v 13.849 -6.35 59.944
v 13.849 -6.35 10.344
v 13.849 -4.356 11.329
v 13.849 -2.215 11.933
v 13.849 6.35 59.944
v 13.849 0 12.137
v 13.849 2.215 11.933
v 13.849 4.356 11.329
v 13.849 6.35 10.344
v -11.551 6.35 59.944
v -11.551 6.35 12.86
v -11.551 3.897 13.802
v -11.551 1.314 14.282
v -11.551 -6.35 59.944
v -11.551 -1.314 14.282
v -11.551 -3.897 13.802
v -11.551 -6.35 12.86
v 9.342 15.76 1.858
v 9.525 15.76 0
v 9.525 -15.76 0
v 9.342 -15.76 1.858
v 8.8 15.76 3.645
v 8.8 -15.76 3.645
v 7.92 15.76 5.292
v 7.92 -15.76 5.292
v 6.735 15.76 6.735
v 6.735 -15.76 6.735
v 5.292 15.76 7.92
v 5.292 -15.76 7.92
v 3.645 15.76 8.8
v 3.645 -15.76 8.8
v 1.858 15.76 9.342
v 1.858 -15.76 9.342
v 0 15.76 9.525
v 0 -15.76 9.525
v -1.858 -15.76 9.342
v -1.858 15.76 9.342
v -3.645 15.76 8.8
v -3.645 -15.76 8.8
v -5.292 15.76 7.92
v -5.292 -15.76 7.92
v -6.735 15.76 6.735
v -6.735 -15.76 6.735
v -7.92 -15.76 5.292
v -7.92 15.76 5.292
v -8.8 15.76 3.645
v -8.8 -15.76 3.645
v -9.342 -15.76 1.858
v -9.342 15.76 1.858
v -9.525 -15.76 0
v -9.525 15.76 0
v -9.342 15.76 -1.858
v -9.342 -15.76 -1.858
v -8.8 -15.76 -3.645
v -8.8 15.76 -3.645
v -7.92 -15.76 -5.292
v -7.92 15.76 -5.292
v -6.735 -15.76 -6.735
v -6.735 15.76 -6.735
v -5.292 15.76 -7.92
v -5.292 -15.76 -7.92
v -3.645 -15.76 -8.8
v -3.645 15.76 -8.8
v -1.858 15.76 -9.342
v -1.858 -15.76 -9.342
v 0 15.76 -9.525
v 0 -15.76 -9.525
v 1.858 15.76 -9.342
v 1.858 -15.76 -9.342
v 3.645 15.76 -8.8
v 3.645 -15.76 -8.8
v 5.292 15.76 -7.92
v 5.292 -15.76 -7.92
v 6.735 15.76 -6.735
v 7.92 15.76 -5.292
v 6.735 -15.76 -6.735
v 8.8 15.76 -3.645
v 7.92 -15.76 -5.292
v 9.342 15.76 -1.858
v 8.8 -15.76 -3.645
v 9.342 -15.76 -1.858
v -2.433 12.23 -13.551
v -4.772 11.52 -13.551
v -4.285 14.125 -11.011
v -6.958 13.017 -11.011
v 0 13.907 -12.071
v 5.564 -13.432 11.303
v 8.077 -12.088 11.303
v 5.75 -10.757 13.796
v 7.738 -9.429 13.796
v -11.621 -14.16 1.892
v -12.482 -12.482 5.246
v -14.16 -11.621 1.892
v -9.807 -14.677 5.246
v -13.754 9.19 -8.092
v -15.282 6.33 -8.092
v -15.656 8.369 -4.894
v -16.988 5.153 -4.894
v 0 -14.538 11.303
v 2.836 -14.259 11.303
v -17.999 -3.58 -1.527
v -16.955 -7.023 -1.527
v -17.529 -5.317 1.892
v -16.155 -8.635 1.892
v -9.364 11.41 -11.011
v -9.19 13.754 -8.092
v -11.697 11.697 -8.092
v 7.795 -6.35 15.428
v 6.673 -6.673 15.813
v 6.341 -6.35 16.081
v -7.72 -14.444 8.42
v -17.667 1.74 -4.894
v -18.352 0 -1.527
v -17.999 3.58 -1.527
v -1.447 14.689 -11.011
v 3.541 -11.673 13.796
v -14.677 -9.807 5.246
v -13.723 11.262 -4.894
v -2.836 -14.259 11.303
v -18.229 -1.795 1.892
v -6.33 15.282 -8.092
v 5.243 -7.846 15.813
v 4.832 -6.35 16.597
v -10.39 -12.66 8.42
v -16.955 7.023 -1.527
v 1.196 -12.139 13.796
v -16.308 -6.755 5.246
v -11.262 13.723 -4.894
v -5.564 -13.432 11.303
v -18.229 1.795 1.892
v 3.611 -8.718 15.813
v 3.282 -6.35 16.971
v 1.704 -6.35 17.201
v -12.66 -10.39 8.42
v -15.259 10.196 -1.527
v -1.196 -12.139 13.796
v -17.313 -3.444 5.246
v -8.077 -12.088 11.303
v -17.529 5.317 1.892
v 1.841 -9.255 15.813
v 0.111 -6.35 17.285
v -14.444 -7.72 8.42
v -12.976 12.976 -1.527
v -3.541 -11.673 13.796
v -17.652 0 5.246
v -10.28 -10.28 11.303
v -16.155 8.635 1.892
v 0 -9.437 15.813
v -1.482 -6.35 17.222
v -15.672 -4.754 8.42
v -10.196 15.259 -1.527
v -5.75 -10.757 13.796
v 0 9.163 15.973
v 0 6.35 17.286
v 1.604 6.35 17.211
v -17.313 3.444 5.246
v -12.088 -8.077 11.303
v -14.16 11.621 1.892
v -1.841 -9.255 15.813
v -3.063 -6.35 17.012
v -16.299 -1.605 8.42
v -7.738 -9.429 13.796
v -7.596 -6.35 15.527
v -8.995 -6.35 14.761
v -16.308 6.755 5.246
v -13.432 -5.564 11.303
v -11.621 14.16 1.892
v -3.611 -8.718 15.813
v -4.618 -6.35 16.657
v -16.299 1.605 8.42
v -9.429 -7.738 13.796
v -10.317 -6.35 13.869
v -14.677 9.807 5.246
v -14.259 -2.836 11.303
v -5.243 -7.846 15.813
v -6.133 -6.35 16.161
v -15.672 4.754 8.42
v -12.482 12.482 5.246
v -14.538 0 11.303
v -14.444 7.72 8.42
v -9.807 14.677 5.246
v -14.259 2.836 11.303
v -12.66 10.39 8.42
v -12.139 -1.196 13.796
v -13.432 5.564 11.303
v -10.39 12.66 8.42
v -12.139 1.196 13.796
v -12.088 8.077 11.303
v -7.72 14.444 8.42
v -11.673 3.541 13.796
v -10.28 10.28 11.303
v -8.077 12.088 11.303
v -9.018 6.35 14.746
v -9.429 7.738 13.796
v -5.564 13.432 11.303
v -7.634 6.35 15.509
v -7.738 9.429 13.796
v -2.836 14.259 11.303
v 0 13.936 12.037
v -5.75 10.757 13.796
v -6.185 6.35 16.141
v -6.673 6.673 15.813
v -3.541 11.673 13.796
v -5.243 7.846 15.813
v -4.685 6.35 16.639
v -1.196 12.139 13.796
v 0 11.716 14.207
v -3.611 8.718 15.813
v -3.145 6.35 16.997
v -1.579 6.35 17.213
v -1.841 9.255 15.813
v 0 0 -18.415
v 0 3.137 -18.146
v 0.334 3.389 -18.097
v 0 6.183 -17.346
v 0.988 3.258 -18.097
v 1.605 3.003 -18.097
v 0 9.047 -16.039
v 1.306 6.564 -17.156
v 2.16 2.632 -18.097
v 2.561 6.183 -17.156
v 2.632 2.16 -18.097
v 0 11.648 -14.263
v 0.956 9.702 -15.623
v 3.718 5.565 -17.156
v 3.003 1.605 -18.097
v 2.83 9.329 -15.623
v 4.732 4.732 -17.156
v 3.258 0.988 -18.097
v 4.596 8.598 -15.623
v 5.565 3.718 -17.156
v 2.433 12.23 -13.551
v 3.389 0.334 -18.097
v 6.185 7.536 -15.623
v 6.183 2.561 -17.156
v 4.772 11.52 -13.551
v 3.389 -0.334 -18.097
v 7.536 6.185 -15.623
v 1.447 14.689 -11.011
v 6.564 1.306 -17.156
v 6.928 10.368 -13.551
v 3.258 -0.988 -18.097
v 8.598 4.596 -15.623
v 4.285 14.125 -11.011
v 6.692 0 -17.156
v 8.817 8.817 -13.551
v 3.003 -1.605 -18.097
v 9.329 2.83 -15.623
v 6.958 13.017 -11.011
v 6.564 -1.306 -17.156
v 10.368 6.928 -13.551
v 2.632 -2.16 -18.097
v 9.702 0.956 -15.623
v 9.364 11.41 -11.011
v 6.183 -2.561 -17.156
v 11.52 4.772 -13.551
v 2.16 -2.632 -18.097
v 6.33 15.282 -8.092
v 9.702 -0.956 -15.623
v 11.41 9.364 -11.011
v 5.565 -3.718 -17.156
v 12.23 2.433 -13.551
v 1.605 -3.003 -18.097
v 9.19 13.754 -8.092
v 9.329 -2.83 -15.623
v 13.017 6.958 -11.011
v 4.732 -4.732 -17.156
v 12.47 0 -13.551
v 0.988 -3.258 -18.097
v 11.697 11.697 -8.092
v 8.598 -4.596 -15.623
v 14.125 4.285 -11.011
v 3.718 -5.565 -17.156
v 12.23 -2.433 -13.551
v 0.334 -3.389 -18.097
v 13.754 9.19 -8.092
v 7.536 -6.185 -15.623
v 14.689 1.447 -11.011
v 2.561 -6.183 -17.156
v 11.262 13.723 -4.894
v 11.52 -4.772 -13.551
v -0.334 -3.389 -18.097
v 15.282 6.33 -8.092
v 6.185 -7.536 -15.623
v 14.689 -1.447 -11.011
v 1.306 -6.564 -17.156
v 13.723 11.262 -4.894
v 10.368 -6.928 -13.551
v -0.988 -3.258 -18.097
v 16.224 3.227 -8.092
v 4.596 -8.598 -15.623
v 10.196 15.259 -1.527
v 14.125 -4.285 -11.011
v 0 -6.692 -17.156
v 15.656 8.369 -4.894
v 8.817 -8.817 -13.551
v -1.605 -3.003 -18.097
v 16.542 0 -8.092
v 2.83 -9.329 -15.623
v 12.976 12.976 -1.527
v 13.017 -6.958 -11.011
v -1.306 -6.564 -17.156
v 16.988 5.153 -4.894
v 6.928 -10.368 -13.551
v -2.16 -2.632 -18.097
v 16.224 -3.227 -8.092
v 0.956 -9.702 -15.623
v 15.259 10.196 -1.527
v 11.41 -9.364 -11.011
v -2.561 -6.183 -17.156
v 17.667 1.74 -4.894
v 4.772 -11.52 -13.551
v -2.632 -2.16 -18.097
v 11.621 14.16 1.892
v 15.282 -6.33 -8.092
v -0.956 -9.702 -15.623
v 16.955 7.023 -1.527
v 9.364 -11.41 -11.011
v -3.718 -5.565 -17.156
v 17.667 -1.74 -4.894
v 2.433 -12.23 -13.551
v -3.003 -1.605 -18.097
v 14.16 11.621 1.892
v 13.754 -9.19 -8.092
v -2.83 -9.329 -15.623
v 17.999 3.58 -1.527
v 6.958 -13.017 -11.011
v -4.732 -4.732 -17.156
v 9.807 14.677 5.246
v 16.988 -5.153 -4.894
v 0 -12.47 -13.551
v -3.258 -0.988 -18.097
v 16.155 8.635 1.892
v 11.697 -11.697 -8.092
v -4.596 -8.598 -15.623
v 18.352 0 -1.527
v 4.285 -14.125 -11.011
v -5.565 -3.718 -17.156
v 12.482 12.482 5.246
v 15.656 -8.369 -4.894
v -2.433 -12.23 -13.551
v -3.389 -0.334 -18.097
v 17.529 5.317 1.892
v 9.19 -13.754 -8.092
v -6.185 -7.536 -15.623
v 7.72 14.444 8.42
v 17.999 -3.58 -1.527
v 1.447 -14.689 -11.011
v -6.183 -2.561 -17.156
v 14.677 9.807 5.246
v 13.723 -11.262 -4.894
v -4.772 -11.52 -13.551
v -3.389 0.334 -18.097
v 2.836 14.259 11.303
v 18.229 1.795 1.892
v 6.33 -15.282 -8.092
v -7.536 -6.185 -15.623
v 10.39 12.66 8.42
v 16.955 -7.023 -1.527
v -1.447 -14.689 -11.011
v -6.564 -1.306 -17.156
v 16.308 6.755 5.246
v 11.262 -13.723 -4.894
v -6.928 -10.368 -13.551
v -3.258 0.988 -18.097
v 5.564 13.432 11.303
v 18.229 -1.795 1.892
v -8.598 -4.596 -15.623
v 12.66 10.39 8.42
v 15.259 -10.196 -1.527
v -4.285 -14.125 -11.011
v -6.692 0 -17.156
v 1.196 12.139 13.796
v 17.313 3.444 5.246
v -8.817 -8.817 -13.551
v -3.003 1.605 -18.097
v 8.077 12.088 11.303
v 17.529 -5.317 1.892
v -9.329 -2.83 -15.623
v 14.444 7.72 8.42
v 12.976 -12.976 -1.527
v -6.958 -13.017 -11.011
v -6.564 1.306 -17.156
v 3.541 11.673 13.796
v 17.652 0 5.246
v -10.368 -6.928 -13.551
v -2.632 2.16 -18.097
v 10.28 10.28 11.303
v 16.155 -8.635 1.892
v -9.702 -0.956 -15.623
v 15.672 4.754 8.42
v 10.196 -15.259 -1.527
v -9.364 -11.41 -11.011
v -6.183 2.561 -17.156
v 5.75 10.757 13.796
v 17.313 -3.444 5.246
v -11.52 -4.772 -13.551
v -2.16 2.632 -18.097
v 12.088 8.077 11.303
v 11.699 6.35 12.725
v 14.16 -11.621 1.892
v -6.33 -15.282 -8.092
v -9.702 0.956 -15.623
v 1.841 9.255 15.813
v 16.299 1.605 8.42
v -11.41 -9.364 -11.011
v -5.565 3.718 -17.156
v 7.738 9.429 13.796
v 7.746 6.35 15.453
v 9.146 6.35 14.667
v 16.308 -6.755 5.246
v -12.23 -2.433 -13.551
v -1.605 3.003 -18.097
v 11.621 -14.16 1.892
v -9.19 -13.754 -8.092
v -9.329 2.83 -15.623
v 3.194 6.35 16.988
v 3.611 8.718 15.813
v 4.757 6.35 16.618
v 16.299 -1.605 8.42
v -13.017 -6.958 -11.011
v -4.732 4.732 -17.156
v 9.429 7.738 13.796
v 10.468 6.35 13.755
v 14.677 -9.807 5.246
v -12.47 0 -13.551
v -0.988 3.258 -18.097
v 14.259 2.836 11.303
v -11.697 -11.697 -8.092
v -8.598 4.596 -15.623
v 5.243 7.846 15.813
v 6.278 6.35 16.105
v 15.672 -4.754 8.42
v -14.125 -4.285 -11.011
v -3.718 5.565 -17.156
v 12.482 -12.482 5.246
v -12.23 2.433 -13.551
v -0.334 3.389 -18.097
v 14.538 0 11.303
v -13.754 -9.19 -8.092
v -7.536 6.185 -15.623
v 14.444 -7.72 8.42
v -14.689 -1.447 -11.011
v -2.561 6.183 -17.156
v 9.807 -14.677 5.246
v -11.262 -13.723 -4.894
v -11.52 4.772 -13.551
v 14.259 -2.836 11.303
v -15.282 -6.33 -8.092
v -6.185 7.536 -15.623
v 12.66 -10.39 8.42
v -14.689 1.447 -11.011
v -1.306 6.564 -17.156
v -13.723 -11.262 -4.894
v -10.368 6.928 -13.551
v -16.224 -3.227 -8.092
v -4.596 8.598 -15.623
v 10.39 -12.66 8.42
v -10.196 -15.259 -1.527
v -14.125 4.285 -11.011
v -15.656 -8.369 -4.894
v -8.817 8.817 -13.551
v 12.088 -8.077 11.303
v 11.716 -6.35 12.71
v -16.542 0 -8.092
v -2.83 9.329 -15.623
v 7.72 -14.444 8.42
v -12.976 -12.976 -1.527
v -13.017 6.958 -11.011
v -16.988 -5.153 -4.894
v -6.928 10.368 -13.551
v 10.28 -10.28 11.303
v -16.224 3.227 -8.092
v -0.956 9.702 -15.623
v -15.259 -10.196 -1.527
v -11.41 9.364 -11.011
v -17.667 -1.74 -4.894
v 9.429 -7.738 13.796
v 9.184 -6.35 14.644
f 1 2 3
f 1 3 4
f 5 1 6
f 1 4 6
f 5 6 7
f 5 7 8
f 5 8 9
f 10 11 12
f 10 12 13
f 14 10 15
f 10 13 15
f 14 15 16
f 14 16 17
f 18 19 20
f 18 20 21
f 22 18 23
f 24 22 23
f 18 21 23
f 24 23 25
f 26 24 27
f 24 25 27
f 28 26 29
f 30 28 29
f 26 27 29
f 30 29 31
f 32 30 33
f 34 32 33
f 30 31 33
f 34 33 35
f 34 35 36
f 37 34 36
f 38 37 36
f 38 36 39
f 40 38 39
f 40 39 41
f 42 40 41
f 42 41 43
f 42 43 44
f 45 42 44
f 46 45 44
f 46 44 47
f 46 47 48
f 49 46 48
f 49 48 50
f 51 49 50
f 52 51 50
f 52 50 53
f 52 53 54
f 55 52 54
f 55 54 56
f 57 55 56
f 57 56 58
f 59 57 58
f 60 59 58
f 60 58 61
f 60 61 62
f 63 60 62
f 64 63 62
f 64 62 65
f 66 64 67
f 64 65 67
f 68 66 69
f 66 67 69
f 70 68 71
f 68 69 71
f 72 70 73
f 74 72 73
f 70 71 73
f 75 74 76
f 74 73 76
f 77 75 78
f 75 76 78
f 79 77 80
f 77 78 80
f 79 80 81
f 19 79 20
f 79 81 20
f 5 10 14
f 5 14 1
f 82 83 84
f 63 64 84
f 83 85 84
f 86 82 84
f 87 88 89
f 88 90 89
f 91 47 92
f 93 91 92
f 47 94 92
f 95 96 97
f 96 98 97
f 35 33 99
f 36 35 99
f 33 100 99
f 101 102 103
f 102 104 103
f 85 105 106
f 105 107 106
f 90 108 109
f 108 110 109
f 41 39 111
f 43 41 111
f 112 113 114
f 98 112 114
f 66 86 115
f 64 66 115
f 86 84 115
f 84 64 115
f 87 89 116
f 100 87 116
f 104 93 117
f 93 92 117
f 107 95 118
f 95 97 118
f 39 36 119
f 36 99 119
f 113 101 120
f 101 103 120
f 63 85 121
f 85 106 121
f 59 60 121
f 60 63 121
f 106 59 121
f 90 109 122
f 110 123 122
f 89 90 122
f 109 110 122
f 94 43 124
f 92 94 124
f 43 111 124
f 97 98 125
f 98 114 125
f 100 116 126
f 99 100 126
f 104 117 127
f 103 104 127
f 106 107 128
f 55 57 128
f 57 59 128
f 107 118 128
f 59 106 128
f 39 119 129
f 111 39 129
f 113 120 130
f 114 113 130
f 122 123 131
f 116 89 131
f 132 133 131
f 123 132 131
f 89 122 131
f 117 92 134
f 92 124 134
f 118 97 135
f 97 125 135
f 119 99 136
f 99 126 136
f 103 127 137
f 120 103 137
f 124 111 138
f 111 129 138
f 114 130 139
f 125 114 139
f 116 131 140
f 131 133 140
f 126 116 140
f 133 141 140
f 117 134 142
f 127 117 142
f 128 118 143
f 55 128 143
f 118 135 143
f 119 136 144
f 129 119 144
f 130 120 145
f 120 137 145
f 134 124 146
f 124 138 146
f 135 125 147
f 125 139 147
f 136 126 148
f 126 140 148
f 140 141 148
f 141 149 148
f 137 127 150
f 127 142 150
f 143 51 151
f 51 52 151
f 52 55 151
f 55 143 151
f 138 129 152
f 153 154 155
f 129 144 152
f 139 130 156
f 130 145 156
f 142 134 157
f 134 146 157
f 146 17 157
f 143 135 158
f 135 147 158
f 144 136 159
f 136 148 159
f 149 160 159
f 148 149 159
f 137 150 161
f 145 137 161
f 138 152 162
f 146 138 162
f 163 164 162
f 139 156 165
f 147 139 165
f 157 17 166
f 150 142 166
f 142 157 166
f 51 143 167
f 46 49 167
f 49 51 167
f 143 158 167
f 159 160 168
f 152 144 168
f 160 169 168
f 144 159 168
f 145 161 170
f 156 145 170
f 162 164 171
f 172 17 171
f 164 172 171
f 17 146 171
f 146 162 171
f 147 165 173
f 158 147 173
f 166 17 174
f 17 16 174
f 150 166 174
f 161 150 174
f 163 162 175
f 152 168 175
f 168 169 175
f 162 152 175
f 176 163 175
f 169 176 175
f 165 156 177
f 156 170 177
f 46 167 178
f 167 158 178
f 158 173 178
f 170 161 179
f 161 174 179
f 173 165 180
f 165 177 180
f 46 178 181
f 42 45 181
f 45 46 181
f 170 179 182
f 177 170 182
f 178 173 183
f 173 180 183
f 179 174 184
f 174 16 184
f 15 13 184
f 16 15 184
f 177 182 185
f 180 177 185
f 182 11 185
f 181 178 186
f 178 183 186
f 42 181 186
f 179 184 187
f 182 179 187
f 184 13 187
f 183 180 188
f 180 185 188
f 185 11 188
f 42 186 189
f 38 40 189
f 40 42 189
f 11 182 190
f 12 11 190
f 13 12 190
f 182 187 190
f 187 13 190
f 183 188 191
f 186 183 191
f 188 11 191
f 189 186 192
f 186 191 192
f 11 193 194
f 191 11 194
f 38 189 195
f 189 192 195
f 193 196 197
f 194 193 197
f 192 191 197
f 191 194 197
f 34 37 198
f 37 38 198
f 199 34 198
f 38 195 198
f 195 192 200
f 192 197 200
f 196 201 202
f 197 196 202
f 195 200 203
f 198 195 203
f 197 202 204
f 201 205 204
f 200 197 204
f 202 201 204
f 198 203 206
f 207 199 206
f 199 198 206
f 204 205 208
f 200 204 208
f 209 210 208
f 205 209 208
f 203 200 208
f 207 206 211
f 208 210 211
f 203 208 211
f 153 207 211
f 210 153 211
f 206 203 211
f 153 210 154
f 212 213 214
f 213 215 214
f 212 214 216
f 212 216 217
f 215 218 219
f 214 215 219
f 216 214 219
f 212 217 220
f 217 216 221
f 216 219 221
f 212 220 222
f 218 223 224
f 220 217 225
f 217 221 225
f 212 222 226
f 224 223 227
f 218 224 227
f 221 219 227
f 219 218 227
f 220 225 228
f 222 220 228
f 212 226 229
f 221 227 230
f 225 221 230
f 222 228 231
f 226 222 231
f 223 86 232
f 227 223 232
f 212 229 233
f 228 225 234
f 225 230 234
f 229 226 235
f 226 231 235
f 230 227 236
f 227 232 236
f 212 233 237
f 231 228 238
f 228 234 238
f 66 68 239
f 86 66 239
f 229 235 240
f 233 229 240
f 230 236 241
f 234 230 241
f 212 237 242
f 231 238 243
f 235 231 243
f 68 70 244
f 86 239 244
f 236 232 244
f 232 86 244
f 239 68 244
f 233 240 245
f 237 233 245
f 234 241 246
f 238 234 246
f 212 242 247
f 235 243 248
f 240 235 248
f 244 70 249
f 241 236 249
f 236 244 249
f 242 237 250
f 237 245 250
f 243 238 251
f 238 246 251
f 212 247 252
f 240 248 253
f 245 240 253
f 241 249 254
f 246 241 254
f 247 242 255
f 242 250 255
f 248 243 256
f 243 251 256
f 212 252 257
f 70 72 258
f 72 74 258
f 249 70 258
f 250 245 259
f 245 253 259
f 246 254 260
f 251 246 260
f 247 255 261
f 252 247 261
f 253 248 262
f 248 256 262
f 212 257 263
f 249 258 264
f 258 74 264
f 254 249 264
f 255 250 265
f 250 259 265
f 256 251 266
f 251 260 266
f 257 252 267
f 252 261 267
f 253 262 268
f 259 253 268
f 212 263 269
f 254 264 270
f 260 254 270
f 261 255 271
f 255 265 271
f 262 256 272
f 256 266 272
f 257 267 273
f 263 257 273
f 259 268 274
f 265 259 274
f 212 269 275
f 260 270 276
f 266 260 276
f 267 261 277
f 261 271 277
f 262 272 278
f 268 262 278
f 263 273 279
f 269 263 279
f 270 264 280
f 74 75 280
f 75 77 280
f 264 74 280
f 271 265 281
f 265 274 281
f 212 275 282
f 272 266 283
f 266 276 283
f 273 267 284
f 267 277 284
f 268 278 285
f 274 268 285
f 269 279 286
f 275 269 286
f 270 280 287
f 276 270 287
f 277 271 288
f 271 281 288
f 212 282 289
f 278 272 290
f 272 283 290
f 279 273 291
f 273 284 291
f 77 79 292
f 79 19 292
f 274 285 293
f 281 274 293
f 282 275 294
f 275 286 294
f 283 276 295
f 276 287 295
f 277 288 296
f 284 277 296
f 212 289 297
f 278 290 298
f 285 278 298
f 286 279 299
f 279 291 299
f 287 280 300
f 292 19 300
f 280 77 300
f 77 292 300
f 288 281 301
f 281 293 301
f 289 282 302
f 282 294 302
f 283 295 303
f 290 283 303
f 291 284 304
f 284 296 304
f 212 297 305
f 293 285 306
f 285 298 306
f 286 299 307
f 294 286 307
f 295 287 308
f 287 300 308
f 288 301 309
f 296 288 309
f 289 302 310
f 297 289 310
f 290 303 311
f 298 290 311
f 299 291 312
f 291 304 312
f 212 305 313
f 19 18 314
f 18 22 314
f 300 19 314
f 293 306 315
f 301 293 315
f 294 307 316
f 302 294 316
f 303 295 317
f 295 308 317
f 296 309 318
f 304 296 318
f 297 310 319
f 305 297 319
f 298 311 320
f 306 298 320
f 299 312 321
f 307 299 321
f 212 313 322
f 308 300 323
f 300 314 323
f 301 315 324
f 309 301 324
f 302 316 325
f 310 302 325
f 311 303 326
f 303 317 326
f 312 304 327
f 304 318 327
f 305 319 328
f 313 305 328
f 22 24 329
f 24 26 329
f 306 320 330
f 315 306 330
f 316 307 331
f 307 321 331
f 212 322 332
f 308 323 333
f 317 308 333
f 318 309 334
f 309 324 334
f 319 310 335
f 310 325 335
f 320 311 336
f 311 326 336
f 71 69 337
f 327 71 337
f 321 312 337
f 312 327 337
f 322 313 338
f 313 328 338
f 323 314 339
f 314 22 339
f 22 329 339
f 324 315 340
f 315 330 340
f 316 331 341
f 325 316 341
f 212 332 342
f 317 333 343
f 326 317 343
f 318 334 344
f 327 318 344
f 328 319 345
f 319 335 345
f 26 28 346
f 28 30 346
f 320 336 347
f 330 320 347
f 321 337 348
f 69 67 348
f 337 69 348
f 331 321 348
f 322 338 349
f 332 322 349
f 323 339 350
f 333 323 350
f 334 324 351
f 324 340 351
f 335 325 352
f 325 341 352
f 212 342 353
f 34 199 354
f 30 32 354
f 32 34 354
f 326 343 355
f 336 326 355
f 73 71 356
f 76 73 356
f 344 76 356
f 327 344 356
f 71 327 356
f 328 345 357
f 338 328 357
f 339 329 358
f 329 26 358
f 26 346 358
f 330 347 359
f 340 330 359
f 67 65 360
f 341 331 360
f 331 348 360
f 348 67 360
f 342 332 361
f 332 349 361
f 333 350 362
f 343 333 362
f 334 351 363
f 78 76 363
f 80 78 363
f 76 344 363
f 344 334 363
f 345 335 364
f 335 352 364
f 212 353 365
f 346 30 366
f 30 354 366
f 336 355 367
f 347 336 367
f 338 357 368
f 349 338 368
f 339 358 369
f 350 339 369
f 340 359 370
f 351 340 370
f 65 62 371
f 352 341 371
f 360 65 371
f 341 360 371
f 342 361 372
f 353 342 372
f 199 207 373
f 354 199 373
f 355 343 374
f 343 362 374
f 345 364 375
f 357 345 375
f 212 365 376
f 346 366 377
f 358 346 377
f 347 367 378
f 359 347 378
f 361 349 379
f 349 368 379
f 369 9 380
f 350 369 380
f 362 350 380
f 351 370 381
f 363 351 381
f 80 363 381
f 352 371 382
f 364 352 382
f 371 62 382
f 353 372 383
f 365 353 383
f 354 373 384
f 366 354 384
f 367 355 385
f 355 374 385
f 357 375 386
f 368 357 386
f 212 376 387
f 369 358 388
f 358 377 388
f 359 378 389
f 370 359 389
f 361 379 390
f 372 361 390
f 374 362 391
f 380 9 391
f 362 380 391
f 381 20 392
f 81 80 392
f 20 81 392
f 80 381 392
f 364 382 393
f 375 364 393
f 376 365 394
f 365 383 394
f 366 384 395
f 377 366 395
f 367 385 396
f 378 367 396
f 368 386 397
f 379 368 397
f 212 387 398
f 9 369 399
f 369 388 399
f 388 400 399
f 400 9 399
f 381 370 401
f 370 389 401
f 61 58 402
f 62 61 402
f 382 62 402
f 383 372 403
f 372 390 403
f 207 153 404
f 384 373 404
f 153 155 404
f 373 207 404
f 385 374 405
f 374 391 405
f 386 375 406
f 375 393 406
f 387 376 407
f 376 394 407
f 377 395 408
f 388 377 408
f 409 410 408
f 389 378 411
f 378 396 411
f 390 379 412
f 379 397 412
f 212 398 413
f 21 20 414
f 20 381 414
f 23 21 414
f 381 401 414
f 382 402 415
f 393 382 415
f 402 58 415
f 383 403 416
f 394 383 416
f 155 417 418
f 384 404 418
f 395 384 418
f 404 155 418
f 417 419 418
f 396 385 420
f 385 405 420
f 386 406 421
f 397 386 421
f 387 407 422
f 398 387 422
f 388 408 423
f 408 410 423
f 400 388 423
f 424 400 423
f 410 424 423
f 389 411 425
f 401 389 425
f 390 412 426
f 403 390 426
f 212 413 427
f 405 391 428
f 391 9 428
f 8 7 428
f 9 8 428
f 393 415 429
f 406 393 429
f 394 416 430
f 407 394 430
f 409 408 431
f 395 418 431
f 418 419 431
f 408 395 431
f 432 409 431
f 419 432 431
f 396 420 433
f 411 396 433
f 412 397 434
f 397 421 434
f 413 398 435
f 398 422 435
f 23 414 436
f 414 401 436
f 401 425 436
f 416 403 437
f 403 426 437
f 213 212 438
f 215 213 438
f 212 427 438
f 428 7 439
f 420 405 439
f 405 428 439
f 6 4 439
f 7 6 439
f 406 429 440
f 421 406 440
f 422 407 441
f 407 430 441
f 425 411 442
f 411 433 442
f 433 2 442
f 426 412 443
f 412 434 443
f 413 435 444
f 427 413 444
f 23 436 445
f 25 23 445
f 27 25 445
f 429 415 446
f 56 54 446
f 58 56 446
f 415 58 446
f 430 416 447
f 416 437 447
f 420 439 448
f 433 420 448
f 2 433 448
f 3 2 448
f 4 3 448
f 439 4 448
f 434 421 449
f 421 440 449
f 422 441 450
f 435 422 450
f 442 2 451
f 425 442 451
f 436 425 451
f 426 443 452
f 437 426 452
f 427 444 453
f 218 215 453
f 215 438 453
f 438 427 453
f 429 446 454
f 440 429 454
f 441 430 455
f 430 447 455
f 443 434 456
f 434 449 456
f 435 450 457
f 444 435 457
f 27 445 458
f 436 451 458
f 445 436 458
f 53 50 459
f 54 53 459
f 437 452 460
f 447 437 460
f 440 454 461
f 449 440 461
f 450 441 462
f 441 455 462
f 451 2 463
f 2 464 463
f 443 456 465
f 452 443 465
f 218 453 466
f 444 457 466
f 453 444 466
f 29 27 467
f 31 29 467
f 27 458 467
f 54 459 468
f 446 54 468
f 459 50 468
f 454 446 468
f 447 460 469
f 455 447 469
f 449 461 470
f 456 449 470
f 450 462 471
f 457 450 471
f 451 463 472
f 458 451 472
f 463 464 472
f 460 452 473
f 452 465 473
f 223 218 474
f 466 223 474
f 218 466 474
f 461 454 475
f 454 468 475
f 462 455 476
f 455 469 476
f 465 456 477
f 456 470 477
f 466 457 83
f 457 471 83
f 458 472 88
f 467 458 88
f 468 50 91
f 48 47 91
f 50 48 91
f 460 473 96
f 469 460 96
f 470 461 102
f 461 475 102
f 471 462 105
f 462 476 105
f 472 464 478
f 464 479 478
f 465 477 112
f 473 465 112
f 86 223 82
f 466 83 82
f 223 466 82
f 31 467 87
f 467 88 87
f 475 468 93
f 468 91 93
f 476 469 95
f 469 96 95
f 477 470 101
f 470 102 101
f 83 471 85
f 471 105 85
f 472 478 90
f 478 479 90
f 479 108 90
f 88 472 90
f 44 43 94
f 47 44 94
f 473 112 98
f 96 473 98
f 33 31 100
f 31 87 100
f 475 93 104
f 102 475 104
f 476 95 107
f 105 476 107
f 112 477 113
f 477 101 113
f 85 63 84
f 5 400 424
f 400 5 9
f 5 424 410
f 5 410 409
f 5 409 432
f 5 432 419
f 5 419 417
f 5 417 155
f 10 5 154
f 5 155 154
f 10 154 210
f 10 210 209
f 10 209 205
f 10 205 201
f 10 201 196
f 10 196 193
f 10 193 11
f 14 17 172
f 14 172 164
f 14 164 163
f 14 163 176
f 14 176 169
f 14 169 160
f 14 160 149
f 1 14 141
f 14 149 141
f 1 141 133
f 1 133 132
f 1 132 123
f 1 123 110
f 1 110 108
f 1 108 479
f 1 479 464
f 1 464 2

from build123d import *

# Parameters (mm, degrees)
F3_DEPTH = 59.944
F4_R     = 9.525
F5_DEPTH = 38.1


with BuildPart() as f1:
    # F0 (on Right) → F1 (revolve)
    with BuildSketch(Plane.YZ):
        with BuildLine():
            Line((0, 0), (0, -18.415))
            ThreePointArc((0, -18.415), (18.415, 0), (0, 18.415))
            Line((0, 18.415), (0, 0))
        make_face()
    revolve(axis=Axis((0, 0, -9.2075), (0, 0, -1)))

    # F2 (on Top) → F3 (join)
    with BuildSketch(Plane.XY):
        Polygon((13.84911329, 6.35), (-11.55088671, 6.35), (-11.55088671, -6.35), (0, -6.35), (13.84911329, -6.35), align=None)
    extrude(amount=F3_DEPTH)

    # F4 (on Front) → F5 (cut, symmetric)
    with BuildSketch(Plane.XZ):
        Circle(F4_R)
    extrude(amount=F5_DEPTH, both=True, mode=Mode.SUBTRACT)


solid = f1.part
